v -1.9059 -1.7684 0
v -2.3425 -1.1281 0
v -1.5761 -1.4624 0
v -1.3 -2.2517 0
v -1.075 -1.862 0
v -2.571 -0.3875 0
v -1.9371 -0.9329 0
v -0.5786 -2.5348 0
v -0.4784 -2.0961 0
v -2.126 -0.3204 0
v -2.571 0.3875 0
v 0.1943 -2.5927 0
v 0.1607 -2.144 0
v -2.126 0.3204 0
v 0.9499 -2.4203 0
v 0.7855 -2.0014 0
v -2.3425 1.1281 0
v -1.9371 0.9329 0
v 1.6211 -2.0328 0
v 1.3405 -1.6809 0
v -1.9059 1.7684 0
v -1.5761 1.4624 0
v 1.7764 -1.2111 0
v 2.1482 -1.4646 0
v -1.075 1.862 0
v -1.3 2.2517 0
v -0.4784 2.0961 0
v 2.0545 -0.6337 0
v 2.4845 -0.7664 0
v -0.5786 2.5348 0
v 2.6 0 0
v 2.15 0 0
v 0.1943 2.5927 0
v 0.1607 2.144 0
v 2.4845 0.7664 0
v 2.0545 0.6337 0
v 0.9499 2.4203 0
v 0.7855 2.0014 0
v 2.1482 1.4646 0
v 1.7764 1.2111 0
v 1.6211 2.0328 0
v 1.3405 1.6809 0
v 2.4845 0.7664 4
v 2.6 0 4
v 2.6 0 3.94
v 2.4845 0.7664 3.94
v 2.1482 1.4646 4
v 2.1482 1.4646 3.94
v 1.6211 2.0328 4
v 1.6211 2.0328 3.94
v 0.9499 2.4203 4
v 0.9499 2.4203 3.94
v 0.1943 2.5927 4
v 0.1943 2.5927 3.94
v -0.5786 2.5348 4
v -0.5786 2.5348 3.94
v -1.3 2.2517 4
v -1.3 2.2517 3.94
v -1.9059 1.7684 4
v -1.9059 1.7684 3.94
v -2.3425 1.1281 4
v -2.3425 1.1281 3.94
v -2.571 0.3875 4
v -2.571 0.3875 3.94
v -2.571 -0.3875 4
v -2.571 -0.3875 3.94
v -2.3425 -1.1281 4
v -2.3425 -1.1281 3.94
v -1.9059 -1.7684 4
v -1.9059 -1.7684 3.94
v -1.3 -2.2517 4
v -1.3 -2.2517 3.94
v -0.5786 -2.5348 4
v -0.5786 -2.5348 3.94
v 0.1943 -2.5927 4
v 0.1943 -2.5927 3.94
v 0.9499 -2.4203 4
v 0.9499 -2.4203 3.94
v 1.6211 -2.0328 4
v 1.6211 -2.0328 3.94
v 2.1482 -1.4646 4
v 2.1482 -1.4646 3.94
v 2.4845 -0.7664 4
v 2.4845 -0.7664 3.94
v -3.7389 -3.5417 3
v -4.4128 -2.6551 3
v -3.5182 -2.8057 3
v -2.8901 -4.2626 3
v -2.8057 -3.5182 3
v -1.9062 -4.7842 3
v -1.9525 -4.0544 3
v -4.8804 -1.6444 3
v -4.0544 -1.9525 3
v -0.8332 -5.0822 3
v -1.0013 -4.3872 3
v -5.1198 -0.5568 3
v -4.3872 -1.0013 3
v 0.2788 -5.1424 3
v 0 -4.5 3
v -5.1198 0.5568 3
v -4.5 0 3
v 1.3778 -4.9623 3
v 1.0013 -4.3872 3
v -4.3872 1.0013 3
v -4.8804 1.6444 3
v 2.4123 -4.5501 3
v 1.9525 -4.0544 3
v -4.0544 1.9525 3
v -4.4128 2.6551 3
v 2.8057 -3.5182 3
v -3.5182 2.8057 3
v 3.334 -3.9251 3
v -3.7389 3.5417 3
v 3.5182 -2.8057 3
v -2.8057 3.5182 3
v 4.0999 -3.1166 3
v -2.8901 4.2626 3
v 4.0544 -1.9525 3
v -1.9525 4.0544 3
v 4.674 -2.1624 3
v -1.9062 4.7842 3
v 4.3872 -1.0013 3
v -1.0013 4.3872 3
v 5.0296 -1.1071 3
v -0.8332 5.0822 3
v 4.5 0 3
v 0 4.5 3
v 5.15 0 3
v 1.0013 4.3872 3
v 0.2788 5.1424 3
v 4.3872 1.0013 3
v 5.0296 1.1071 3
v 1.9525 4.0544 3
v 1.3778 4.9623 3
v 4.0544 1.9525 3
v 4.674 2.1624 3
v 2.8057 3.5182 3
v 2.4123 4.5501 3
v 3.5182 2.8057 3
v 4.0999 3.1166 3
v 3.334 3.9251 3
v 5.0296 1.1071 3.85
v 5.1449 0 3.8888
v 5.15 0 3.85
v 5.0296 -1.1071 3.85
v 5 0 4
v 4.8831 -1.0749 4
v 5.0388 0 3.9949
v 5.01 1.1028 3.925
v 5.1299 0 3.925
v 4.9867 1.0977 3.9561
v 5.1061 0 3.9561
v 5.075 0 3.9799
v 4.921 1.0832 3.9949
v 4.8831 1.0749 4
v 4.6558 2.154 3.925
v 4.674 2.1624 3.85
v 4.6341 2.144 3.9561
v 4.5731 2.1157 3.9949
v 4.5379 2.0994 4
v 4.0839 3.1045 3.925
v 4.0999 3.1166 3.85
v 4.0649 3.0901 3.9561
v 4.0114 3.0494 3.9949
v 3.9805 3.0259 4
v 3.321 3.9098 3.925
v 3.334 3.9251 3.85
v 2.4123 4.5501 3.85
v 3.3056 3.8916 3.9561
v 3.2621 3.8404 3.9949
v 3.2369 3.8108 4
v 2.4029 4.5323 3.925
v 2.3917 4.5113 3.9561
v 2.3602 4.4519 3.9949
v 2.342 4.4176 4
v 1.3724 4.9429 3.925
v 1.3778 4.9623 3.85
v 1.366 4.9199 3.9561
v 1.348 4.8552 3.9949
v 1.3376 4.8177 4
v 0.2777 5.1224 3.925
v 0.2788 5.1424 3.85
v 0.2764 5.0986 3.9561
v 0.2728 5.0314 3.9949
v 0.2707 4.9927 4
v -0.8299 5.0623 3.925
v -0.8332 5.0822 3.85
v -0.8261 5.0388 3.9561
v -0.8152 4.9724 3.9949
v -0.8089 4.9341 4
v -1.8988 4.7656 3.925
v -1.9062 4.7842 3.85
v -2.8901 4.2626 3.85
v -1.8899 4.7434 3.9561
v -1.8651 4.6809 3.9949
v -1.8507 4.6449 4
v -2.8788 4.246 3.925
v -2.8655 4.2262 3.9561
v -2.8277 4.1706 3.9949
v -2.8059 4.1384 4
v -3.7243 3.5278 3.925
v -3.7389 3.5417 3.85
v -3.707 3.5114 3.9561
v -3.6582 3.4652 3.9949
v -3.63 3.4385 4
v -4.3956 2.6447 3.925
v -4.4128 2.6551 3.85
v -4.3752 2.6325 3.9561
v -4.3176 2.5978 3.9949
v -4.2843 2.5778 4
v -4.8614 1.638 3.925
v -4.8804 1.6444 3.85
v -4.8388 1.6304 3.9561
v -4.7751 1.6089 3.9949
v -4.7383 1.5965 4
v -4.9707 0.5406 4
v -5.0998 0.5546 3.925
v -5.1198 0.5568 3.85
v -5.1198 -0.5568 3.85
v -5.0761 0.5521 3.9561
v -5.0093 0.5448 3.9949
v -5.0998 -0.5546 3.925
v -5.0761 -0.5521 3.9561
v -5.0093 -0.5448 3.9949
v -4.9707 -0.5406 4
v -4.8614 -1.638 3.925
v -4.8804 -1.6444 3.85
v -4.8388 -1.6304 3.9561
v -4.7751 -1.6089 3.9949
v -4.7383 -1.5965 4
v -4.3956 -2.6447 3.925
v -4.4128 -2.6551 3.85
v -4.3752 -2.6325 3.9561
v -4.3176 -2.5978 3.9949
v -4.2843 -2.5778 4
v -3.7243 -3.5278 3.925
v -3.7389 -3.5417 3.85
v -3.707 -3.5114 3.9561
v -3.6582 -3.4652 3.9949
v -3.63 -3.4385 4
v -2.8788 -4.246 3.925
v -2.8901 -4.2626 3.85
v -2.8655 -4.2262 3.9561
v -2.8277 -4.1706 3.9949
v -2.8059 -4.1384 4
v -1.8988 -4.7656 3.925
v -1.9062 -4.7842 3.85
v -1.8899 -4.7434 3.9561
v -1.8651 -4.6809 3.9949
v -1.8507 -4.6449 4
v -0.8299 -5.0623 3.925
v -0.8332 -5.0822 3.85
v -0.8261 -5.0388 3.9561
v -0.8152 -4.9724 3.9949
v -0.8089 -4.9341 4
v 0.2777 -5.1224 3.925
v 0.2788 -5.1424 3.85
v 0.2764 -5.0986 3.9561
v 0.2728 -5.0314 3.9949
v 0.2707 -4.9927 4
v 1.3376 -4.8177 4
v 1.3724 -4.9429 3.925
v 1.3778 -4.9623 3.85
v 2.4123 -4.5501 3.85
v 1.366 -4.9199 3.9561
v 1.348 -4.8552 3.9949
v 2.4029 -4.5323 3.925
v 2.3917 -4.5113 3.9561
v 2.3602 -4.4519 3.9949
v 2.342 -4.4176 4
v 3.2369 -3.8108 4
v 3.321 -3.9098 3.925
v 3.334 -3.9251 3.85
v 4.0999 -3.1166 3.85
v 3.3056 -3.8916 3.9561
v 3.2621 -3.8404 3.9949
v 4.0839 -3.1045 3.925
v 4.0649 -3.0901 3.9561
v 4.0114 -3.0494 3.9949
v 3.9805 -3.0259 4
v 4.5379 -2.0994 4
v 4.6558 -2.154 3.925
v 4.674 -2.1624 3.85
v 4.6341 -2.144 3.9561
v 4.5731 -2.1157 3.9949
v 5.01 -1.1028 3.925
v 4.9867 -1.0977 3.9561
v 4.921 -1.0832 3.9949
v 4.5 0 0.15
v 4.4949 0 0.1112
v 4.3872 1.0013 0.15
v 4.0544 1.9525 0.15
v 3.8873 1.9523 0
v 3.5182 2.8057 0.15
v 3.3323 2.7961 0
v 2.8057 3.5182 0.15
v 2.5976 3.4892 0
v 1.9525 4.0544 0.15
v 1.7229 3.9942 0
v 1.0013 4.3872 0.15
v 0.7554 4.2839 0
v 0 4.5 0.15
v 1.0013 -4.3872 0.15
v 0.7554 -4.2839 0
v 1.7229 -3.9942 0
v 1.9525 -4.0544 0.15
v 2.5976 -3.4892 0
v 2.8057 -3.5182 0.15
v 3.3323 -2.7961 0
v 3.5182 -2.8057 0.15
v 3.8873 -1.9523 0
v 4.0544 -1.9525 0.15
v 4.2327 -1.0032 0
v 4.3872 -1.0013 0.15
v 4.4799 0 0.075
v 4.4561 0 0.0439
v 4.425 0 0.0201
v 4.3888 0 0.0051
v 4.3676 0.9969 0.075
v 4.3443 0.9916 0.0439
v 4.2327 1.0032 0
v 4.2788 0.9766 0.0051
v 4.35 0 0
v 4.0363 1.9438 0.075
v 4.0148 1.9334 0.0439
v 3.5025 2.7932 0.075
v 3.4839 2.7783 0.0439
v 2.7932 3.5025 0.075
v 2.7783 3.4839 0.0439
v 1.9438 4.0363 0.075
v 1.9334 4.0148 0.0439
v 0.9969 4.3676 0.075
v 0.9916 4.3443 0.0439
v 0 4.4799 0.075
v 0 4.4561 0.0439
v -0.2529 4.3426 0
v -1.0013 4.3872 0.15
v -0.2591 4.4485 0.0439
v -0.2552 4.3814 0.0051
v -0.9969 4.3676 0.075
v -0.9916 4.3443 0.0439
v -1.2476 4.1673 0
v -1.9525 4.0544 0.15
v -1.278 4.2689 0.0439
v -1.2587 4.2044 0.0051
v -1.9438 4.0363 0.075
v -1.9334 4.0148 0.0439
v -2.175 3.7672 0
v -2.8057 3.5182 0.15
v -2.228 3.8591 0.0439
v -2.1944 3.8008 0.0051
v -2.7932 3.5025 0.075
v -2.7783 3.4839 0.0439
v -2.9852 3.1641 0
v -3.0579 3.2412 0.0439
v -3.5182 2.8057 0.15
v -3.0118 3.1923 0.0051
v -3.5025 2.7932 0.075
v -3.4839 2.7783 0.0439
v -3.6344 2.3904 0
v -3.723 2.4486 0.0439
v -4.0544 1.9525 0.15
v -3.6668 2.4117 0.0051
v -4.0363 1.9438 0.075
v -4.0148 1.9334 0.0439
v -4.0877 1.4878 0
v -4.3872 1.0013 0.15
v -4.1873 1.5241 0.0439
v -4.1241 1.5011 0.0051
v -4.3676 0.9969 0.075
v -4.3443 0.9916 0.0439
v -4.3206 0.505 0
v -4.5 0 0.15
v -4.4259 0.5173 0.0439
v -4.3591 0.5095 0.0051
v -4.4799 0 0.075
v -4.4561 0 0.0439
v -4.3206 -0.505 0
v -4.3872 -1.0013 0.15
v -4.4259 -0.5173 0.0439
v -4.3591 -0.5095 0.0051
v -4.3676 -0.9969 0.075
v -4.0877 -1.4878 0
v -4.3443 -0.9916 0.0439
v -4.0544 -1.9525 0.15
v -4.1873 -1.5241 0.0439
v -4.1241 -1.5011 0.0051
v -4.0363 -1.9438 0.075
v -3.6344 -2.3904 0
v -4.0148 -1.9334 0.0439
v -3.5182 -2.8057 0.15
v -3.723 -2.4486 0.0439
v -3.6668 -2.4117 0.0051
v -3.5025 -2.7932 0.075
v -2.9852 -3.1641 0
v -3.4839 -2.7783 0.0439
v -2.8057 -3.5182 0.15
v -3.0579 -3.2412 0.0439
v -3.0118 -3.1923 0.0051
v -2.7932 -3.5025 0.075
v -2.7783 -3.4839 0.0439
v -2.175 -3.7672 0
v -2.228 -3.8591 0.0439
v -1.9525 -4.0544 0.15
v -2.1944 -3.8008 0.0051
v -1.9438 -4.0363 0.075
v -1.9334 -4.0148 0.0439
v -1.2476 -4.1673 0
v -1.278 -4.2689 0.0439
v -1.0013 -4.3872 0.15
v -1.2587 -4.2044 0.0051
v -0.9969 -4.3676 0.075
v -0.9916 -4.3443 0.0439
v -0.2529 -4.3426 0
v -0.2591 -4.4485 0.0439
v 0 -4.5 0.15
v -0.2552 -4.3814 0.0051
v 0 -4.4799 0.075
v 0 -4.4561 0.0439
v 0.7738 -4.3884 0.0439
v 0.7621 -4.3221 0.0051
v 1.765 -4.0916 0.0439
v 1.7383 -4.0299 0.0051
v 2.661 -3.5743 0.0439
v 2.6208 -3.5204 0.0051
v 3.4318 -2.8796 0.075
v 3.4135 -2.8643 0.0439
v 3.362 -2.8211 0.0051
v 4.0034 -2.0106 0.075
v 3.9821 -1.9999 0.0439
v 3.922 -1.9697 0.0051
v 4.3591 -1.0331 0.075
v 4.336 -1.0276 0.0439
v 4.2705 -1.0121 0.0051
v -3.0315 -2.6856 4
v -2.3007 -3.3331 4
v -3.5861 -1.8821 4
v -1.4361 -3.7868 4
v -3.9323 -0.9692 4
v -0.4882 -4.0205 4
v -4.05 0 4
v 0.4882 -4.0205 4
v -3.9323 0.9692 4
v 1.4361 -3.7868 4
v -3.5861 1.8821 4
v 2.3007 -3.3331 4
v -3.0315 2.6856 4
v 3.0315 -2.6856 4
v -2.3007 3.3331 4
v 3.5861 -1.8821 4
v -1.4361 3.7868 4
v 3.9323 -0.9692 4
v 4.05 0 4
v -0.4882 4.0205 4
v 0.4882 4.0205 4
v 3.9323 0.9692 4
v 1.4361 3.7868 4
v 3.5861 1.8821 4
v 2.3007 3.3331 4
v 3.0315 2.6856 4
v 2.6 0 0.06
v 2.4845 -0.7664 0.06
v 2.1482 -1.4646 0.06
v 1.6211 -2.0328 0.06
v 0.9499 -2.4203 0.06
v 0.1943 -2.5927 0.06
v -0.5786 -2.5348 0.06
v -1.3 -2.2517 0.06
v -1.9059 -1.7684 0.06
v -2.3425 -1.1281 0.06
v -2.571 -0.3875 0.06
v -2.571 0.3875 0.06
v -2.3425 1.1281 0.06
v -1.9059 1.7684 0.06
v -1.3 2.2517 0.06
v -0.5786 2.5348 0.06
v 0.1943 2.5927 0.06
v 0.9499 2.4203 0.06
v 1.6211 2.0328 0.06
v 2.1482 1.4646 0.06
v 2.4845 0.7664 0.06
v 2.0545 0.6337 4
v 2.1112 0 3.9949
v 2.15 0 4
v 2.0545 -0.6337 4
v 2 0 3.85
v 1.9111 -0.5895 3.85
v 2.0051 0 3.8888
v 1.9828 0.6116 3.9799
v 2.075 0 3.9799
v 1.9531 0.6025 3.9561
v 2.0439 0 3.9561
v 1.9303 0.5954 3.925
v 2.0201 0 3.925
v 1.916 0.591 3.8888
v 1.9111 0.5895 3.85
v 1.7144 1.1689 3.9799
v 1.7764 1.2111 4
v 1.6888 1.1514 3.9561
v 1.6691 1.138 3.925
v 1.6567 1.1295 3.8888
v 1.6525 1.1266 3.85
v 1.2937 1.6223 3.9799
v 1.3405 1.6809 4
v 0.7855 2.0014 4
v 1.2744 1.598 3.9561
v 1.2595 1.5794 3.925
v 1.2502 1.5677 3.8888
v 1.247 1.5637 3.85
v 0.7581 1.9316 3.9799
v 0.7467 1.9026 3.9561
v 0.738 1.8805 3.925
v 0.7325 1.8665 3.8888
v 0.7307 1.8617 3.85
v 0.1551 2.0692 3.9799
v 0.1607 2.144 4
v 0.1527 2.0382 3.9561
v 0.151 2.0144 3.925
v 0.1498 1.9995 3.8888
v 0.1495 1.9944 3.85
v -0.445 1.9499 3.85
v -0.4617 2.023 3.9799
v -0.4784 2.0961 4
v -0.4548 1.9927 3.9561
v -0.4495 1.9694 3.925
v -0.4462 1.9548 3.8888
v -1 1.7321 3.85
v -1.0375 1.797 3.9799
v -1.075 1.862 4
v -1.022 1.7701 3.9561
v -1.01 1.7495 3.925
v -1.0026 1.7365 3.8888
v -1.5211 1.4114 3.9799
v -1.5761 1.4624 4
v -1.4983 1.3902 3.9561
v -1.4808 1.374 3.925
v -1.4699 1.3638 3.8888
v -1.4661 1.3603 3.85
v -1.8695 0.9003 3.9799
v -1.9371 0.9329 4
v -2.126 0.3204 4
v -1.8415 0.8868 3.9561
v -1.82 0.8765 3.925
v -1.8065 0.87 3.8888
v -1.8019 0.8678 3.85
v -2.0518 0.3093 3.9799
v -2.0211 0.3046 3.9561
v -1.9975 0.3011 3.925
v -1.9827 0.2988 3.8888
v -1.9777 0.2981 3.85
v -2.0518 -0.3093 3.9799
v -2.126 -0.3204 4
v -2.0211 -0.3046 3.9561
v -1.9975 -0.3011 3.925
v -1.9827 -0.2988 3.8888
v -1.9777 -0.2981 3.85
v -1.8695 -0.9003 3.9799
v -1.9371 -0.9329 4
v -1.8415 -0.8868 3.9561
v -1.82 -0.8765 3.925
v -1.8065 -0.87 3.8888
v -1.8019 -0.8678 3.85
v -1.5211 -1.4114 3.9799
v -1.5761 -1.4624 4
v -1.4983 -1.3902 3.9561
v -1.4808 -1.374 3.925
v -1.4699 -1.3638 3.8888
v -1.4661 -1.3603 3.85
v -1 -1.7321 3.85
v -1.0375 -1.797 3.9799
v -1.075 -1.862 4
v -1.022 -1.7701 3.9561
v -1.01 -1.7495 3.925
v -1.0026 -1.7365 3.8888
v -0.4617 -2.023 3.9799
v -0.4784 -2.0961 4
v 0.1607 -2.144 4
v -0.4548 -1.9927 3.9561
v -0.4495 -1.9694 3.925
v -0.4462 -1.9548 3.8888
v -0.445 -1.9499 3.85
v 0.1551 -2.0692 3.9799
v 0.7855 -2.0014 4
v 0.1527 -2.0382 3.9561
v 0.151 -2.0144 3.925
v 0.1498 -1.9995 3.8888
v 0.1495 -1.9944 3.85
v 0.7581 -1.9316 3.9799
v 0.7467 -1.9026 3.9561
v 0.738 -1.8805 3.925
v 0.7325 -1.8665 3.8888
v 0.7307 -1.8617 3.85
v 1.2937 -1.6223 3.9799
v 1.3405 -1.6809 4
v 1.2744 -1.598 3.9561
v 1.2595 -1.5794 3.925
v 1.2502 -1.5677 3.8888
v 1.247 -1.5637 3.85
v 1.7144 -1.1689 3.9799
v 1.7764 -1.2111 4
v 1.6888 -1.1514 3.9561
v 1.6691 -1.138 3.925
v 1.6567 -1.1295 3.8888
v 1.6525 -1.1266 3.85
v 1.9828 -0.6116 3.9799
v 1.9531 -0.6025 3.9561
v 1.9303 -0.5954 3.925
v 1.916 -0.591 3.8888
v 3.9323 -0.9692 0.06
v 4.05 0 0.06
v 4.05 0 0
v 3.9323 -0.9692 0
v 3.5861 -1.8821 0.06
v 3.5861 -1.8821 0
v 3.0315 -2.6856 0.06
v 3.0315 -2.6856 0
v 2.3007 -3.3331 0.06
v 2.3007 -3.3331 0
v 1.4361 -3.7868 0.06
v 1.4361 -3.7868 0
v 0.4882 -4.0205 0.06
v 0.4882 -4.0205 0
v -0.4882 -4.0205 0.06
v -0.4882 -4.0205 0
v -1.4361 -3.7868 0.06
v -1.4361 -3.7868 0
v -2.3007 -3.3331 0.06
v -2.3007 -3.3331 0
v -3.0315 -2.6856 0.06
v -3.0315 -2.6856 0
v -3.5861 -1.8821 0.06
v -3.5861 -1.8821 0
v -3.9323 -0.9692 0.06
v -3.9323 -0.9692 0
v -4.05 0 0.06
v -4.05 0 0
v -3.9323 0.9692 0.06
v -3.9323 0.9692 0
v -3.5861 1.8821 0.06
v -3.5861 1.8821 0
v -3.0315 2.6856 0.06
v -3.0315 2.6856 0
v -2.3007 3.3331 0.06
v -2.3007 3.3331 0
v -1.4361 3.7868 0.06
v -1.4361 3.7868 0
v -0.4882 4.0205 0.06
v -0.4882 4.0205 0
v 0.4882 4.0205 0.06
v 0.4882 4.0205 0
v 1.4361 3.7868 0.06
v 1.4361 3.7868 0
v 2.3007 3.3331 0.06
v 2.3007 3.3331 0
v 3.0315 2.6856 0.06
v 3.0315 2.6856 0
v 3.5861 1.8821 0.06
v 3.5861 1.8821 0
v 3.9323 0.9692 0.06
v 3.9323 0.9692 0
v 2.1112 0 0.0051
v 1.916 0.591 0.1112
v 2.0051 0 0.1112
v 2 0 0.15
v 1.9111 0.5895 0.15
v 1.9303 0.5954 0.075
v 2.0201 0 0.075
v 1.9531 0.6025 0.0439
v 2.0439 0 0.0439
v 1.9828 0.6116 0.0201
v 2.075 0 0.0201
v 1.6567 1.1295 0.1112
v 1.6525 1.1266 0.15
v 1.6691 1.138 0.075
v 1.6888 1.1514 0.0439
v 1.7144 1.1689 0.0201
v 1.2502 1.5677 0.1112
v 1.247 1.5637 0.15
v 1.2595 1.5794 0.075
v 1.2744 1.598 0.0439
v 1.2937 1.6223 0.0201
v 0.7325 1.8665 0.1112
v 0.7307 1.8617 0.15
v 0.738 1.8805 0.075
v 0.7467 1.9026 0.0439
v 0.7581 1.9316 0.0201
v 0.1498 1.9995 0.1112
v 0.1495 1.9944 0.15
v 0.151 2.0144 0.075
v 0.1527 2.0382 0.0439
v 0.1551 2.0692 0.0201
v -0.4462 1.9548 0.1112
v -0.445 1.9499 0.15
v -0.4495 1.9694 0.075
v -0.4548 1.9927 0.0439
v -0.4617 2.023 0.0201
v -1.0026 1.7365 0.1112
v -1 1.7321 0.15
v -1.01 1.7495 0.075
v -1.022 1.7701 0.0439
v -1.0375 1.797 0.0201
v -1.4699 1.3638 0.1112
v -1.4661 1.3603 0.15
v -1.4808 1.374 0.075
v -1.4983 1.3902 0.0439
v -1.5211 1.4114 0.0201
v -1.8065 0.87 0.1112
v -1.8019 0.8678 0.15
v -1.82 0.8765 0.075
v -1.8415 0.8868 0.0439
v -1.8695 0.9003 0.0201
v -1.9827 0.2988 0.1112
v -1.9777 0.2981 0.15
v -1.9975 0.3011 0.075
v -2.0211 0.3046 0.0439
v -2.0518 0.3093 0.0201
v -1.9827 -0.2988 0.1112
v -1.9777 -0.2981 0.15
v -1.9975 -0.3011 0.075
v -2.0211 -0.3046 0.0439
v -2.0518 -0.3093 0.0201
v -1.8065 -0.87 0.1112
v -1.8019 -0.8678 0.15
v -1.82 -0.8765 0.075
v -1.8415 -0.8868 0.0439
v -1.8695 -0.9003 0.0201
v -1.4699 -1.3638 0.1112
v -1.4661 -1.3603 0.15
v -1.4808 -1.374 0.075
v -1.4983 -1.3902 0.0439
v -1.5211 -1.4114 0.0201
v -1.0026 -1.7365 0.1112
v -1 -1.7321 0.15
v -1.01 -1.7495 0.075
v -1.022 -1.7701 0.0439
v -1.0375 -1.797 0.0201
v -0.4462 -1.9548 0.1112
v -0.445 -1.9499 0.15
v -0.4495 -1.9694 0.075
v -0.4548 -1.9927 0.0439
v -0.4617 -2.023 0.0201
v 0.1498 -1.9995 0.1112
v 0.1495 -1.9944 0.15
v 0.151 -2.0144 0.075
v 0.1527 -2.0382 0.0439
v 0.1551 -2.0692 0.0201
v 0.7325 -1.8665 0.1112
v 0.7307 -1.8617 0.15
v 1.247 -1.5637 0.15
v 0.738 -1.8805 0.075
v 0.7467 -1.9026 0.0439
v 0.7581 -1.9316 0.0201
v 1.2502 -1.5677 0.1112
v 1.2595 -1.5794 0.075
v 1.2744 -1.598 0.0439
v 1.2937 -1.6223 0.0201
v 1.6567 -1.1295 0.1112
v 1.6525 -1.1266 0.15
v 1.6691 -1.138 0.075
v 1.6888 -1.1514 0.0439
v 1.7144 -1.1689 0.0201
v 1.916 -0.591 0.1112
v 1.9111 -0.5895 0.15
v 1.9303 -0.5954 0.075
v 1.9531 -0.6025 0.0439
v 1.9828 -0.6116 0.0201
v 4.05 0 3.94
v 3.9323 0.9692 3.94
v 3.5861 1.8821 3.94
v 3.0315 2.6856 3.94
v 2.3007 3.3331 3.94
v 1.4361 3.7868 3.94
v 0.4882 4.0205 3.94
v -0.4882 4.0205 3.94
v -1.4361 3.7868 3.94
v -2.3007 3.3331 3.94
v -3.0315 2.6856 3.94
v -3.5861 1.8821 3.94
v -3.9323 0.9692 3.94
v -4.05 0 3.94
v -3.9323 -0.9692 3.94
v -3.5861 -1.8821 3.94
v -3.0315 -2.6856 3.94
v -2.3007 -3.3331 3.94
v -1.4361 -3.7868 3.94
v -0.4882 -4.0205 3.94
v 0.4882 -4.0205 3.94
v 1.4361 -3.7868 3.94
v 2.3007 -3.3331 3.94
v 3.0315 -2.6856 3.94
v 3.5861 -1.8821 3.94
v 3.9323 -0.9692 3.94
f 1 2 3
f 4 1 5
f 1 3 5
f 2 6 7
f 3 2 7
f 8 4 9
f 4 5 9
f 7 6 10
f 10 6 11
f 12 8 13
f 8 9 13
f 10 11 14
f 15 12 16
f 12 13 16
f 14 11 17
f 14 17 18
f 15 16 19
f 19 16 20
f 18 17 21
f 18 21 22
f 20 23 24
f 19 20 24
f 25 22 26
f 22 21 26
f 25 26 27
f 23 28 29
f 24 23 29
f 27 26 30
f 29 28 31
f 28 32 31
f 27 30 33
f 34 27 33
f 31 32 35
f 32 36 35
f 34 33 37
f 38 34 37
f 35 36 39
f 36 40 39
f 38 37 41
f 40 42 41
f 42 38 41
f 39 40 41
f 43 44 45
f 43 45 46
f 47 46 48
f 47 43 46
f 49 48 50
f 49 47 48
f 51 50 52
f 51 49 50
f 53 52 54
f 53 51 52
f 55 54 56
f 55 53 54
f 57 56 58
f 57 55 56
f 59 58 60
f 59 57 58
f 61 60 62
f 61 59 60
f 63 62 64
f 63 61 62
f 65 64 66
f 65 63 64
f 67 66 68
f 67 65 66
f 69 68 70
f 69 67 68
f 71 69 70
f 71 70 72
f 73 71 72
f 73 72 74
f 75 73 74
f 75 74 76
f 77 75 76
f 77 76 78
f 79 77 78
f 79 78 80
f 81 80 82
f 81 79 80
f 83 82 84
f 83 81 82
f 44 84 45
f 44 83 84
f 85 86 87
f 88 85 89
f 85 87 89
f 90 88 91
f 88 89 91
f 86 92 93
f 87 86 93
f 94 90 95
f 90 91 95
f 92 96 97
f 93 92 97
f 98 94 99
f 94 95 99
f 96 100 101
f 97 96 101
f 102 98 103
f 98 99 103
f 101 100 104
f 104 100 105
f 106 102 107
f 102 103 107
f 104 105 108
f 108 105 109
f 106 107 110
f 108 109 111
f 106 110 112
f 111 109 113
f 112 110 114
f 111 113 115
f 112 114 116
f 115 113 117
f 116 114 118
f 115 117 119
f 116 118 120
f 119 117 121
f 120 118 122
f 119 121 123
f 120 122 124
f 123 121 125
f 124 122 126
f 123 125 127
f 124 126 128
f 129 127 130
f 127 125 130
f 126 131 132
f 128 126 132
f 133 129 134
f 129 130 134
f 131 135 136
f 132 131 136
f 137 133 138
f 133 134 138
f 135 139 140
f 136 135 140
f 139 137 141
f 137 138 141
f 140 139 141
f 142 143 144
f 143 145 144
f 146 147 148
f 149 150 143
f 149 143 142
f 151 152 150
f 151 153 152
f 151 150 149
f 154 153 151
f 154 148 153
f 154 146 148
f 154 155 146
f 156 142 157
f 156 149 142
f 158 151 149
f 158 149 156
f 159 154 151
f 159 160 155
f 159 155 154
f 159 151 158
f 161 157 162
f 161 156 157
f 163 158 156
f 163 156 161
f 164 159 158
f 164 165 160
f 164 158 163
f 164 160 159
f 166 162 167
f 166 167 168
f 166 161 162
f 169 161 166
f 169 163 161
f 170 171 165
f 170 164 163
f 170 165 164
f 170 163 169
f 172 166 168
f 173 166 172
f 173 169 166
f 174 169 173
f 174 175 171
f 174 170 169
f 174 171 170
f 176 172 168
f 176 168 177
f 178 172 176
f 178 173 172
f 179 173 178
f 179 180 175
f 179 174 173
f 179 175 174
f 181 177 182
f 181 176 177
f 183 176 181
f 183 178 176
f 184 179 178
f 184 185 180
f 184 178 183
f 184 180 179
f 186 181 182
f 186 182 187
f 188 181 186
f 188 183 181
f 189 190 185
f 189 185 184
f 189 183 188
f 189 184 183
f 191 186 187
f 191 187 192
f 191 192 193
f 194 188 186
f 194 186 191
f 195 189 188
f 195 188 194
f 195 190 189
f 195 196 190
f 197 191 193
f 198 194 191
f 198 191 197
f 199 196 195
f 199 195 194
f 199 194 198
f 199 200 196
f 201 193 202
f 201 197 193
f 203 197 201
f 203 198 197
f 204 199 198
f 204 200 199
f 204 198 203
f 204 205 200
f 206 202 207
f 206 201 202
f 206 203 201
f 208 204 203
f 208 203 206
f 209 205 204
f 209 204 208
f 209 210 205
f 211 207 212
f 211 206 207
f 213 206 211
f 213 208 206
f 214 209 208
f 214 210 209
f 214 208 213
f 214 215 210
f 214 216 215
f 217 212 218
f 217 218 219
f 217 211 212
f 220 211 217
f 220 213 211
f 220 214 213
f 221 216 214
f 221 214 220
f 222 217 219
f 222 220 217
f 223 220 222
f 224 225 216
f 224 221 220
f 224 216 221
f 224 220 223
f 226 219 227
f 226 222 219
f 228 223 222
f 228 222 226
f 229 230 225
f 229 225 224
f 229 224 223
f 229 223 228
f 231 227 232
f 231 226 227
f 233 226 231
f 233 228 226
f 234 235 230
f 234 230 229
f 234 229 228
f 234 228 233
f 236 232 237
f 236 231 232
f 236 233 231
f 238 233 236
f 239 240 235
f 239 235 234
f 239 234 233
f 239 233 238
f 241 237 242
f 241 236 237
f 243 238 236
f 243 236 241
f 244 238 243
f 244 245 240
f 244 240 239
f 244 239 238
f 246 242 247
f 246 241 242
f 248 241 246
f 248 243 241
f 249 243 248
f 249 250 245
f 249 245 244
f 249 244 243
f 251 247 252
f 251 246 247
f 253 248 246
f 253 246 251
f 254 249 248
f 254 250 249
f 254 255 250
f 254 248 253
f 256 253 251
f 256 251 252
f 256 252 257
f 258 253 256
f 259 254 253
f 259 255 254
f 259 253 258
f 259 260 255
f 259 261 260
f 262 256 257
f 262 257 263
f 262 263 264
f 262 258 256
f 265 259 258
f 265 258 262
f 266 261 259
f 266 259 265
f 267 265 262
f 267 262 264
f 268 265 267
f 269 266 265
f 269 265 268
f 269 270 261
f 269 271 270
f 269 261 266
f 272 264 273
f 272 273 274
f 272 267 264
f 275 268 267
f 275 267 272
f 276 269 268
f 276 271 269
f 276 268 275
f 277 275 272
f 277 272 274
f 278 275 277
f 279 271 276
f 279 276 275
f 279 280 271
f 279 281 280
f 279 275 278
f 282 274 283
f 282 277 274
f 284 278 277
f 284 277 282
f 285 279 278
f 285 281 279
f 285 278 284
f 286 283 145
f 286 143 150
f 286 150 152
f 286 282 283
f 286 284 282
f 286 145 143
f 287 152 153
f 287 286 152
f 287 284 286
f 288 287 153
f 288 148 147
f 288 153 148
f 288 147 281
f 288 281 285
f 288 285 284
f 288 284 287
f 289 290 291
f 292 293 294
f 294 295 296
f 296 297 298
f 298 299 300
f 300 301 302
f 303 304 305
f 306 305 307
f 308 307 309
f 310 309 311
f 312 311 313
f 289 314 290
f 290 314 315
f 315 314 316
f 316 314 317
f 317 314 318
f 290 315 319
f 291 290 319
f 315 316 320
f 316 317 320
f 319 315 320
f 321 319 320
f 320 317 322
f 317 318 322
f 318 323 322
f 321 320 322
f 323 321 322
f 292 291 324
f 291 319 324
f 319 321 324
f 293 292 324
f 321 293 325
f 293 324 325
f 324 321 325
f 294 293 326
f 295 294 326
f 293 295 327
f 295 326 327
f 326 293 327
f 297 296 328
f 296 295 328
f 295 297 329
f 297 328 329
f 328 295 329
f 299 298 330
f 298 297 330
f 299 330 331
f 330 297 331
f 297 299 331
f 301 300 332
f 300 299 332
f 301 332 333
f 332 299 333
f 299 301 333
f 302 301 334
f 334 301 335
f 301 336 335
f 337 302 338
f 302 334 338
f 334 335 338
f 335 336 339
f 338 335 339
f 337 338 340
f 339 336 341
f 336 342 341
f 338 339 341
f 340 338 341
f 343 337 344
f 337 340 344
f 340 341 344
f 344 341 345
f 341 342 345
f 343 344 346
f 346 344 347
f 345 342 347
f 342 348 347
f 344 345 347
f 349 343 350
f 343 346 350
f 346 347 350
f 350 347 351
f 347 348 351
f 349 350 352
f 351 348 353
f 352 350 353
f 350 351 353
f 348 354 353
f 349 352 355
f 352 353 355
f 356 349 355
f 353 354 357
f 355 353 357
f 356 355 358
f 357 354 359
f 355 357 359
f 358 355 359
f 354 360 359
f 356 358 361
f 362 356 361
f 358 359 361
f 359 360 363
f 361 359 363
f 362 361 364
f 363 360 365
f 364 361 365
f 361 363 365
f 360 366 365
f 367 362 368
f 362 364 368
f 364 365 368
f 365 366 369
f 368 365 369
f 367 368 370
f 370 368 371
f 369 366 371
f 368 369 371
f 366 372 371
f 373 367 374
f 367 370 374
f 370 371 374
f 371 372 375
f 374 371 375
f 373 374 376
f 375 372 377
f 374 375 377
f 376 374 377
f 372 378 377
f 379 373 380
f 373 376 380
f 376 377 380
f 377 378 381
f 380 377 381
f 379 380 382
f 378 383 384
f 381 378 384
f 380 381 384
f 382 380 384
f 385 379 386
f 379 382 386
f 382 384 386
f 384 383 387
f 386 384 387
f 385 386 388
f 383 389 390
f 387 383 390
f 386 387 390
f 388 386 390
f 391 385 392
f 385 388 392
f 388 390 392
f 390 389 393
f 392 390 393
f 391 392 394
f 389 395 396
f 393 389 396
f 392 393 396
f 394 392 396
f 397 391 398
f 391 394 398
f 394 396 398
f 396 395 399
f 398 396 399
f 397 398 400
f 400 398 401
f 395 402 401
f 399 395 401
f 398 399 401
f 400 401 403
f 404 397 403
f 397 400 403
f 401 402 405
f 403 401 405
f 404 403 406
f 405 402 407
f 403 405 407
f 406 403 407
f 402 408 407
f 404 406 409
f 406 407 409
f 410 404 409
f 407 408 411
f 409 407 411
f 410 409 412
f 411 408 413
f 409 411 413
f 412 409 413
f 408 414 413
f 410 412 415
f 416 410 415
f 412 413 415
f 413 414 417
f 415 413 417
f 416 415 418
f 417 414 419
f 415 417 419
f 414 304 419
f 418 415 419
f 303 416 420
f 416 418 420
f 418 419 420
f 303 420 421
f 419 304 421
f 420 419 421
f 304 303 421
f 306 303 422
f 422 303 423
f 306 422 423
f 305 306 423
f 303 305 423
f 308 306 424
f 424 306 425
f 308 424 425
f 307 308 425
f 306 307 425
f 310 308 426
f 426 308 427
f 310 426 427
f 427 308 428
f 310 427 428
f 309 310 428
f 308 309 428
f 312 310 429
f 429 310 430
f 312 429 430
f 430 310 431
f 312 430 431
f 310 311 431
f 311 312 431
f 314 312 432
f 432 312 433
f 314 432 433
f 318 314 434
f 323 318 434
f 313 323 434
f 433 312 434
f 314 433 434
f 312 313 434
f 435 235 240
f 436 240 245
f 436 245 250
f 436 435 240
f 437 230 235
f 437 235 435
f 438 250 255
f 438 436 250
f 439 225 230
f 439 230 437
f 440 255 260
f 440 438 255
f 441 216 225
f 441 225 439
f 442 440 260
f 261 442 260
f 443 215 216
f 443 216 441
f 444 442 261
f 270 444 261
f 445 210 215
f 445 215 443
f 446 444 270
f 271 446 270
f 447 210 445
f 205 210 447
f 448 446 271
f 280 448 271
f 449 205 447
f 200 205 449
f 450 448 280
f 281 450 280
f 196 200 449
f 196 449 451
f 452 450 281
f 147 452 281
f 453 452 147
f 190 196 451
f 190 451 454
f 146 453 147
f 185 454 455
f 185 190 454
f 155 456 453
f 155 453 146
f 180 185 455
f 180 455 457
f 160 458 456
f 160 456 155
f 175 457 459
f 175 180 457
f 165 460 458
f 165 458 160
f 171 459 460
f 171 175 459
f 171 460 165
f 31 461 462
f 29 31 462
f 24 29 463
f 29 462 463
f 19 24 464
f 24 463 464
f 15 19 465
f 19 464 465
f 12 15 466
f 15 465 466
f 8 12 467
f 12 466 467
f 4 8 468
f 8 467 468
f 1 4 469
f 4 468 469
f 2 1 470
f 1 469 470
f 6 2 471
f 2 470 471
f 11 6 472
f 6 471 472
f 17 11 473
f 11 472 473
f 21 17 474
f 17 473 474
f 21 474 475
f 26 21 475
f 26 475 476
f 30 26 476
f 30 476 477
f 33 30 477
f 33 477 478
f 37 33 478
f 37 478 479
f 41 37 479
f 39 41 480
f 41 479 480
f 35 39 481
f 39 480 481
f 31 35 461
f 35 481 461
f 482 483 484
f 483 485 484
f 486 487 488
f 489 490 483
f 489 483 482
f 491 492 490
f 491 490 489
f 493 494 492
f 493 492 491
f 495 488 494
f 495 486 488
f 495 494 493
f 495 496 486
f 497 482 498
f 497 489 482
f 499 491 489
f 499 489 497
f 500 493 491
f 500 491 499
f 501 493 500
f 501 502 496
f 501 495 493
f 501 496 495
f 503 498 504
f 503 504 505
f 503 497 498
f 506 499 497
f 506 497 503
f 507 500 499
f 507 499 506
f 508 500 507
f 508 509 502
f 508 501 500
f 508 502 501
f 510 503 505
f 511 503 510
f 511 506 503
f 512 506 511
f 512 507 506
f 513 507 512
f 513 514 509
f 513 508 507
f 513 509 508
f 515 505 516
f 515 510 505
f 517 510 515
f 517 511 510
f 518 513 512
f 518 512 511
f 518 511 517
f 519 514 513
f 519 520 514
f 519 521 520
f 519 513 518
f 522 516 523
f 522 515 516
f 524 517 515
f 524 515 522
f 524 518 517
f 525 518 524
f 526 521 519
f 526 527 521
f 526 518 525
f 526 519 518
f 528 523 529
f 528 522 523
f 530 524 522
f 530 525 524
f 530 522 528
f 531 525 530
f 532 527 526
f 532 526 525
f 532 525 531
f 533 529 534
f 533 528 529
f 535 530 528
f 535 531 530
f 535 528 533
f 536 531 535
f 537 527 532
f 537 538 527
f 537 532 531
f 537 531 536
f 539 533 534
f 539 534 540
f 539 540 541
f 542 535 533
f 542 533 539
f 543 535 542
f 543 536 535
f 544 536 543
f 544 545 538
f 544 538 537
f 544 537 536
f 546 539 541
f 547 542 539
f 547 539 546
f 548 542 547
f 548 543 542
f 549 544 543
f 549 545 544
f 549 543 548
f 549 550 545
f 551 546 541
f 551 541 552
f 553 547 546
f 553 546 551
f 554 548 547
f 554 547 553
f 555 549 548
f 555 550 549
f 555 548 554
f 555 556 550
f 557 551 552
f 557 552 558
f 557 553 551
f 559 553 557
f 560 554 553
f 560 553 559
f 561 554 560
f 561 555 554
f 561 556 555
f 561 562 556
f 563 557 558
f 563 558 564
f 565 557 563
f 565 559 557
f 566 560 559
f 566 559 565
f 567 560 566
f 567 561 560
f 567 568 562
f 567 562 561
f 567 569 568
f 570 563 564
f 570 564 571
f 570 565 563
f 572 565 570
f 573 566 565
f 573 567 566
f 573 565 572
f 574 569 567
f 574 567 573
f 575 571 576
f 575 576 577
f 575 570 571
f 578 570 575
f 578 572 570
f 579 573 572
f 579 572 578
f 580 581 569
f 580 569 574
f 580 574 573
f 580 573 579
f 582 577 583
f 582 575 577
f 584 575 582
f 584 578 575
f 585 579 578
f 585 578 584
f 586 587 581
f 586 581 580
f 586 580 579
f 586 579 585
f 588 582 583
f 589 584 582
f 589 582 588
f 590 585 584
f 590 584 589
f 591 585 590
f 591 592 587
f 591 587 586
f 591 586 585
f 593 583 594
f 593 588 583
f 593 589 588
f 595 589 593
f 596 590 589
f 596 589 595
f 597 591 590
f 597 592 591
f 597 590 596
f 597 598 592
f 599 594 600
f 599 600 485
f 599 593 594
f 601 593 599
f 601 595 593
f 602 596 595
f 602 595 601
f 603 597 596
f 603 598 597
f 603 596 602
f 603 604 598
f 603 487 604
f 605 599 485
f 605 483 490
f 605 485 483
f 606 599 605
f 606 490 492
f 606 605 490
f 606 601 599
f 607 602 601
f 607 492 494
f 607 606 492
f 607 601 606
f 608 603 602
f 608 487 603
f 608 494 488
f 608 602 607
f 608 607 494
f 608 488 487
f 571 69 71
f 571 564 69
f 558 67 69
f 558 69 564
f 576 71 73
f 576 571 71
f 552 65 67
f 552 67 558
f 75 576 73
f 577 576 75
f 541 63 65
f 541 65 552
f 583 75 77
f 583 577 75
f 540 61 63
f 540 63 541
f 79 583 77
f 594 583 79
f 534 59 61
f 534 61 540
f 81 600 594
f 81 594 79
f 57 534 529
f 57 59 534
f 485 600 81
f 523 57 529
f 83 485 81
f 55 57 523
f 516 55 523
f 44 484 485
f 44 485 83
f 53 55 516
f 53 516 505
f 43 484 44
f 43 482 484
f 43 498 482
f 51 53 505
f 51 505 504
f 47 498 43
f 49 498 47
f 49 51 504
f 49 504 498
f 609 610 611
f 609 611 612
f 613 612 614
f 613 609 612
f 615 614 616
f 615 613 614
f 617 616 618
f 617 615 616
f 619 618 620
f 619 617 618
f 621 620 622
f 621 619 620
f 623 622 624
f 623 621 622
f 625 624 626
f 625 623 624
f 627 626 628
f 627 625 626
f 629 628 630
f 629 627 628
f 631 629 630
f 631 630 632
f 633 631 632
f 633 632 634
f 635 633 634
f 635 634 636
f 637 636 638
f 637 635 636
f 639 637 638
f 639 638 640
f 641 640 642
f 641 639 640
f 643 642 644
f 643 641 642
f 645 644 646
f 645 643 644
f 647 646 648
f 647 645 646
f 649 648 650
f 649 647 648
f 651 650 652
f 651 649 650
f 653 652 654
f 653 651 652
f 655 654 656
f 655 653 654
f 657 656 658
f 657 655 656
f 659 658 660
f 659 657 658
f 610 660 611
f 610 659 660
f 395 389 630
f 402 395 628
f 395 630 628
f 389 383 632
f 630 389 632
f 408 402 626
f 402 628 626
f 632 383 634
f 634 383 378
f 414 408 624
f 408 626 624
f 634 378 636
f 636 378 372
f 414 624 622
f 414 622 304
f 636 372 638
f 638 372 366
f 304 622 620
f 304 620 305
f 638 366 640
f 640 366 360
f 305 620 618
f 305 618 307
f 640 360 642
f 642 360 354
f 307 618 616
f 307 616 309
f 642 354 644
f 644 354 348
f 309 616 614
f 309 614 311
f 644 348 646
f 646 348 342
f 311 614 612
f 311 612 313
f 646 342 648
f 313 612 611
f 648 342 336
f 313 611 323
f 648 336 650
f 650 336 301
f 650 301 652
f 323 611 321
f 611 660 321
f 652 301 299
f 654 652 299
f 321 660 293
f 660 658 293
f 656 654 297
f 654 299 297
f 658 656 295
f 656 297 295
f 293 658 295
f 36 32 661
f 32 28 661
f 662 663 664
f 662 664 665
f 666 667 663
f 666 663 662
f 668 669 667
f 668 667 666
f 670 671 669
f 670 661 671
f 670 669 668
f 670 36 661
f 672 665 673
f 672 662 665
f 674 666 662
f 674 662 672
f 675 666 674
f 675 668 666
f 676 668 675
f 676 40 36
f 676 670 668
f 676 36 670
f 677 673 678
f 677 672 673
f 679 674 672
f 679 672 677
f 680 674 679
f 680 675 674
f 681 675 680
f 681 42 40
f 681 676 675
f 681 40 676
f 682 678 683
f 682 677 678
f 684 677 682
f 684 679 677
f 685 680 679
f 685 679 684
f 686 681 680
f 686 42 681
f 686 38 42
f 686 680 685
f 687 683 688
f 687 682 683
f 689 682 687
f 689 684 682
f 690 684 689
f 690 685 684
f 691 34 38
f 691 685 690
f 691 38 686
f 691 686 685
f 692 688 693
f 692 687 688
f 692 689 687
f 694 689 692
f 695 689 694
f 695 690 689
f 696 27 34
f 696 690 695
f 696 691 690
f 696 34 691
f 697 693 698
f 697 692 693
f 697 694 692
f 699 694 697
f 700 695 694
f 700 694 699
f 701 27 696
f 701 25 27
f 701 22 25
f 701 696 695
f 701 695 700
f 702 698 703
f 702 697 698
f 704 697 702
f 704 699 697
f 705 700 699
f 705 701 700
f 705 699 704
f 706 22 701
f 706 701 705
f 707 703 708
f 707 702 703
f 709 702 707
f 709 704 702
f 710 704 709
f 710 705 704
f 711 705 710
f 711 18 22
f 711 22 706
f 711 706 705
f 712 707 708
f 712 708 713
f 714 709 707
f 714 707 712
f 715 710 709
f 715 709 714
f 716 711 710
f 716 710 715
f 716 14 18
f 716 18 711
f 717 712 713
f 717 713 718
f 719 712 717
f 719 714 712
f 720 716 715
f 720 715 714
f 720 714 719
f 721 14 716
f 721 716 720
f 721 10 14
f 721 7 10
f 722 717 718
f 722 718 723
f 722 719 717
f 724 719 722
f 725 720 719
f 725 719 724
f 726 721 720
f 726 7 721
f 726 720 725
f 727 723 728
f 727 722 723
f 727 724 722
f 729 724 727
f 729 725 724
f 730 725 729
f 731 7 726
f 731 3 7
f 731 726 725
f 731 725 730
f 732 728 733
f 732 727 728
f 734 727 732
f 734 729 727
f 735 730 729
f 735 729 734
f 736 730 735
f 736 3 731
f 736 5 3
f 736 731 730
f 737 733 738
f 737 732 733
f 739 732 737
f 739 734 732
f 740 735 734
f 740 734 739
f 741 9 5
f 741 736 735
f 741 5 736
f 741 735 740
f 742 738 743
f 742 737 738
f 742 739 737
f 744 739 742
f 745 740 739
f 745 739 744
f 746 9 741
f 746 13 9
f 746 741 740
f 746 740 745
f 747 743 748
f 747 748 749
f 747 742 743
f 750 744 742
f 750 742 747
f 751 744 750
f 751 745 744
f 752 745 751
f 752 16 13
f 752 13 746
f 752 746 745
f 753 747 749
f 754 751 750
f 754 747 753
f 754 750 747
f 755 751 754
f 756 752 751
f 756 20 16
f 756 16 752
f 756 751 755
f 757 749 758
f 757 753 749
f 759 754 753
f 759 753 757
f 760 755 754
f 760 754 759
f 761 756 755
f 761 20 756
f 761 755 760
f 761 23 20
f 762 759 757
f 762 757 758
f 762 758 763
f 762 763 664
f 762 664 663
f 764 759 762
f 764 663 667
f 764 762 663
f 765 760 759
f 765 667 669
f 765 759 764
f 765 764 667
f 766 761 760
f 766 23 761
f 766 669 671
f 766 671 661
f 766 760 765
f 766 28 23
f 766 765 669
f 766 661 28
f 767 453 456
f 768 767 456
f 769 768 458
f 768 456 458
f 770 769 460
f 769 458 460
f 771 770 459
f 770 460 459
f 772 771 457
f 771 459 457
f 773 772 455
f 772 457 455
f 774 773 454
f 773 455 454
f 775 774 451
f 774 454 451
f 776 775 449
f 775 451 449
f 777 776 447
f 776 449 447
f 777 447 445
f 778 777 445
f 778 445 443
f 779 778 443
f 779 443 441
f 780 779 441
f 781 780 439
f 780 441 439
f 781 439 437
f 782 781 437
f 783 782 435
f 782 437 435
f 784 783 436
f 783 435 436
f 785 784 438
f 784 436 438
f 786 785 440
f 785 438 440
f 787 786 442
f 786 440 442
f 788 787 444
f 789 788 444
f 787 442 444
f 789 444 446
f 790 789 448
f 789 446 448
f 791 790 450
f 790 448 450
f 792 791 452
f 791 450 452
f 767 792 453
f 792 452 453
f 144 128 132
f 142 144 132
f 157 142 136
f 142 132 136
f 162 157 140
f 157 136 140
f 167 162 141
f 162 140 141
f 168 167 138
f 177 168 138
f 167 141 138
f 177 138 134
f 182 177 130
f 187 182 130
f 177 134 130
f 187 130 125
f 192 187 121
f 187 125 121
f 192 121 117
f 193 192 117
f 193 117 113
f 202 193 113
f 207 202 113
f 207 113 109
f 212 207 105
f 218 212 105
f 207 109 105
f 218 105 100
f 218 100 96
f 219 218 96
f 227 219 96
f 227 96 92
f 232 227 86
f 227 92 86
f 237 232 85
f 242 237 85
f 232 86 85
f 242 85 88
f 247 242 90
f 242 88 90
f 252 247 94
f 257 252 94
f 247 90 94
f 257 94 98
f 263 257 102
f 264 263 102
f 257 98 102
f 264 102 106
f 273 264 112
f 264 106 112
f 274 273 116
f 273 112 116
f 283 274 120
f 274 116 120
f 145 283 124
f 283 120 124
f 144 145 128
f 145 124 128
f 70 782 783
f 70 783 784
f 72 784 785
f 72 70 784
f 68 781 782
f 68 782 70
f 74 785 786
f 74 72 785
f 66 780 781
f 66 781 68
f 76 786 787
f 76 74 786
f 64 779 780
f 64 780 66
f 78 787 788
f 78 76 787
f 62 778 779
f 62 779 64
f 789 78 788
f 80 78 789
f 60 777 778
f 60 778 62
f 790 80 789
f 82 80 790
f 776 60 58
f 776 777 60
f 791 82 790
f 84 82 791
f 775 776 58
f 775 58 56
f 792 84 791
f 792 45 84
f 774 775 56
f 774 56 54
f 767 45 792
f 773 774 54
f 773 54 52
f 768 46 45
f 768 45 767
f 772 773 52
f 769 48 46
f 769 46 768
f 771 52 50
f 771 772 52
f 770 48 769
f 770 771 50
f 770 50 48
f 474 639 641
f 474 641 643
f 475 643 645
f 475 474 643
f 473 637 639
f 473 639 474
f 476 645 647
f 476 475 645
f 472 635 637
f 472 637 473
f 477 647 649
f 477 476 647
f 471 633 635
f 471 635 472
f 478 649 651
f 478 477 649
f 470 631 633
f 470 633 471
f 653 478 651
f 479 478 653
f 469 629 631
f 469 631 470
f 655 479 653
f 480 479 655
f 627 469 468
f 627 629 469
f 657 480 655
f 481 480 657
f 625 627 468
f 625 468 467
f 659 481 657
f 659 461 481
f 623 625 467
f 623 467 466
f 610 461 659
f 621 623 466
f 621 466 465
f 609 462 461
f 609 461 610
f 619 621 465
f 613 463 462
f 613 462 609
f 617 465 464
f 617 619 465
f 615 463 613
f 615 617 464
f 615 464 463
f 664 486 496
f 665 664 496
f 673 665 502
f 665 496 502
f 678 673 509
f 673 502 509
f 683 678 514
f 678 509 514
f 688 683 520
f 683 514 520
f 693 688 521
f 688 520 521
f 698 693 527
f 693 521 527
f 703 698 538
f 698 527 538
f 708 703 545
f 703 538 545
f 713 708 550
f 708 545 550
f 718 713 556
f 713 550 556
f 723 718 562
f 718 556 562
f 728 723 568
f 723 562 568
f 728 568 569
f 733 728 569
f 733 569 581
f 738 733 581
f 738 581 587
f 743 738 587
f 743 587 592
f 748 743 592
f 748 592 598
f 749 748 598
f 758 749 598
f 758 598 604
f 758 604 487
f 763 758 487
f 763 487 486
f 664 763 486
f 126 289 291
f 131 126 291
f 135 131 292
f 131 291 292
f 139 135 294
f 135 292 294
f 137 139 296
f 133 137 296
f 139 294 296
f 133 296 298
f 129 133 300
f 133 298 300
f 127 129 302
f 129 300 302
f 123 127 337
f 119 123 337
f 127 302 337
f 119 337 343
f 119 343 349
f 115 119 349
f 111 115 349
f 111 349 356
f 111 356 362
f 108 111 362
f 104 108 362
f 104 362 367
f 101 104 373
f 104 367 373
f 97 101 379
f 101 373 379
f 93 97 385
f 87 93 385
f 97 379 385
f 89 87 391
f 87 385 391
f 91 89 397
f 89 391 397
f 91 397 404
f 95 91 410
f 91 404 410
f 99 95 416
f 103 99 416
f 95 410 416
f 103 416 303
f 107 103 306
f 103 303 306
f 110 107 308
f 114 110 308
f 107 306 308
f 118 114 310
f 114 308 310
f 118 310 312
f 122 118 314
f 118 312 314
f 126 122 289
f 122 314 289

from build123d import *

# Parameters (mm, degrees)
SKETCH1_R           = 4.5
BOSS_EXTRUDE1_DEPTH = 3
SKETCH2_R           = 5.15
BOSS_EXTRUDE2_DEPTH = 1
SKETCH3_R           = 2
CUT_EXTRUDE1_DEPTH  = 9.309332103
SKETCH4_R           = 4.05
SKETCH4_R_2         = 2.6
CUT_EXTRUDE2_DEPTH  = 0.06
CUT_EXTRUDE3_START  = -0.06
SKETCH5_R           = 4.05
SKETCH5_R_2         = 2.6
CUT_EXTRUDE3_DEPTH  = 0.06
FILLET1_R           = 0.15


with BuildPart() as part:
    # Sketch1 → Boss-Extrude1 (new body)
    with BuildSketch(Plane.XY):
        Circle(SKETCH1_R)
    extrude(amount=BOSS_EXTRUDE1_DEPTH)

    # Sketch2 → Boss-Extrude2 (add)
    with BuildSketch(Plane.XY.offset(3)):
        Circle(SKETCH2_R)
    extrude(amount=BOSS_EXTRUDE2_DEPTH)

    # Sketch3 → Cut-Extrude1 (cut, through all)
    with BuildSketch(Plane.XY.offset(4)):
        Circle(SKETCH3_R)
    extrude(amount=-CUT_EXTRUDE1_DEPTH, mode=Mode.SUBTRACT)

    # Sketch4 → Cut-Extrude2 (cut)
    with BuildSketch(Plane.XY.offset(4)):
        Circle(SKETCH4_R)
        Circle(SKETCH4_R_2, mode=Mode.SUBTRACT)
    extrude(amount=-CUT_EXTRUDE2_DEPTH, mode=Mode.SUBTRACT)

    # Sketch5 → Cut-Extrude3 (cut)
    with BuildSketch(Plane(origin=(0, 0, 0), x_dir=(-1, 0, 0), z_dir=(0, 0, -1)).offset(CUT_EXTRUDE3_START)):
        with Locations(Location((0, 0, 0), (0, 0, 180))):
            Circle(SKETCH5_R)
        with Locations(Location((0, 0, 0), (0, 0, 180))):
            Circle(SKETCH5_R_2, mode=Mode.SUBTRACT)
    extrude(amount=CUT_EXTRUDE3_DEPTH, mode=Mode.SUBTRACT)

    # Fillet1
    fillet1_edges = [part.edges().sort_by_distance(p)[0] for p in [
        (-2, 0, 0),
        (-2, 0, 4),
        (-4.5, 0, 0),
        (-5.15, 0, 4),
    ]]
    fillet(fillet1_edges, radius=FILLET1_R)


solid = part.part
